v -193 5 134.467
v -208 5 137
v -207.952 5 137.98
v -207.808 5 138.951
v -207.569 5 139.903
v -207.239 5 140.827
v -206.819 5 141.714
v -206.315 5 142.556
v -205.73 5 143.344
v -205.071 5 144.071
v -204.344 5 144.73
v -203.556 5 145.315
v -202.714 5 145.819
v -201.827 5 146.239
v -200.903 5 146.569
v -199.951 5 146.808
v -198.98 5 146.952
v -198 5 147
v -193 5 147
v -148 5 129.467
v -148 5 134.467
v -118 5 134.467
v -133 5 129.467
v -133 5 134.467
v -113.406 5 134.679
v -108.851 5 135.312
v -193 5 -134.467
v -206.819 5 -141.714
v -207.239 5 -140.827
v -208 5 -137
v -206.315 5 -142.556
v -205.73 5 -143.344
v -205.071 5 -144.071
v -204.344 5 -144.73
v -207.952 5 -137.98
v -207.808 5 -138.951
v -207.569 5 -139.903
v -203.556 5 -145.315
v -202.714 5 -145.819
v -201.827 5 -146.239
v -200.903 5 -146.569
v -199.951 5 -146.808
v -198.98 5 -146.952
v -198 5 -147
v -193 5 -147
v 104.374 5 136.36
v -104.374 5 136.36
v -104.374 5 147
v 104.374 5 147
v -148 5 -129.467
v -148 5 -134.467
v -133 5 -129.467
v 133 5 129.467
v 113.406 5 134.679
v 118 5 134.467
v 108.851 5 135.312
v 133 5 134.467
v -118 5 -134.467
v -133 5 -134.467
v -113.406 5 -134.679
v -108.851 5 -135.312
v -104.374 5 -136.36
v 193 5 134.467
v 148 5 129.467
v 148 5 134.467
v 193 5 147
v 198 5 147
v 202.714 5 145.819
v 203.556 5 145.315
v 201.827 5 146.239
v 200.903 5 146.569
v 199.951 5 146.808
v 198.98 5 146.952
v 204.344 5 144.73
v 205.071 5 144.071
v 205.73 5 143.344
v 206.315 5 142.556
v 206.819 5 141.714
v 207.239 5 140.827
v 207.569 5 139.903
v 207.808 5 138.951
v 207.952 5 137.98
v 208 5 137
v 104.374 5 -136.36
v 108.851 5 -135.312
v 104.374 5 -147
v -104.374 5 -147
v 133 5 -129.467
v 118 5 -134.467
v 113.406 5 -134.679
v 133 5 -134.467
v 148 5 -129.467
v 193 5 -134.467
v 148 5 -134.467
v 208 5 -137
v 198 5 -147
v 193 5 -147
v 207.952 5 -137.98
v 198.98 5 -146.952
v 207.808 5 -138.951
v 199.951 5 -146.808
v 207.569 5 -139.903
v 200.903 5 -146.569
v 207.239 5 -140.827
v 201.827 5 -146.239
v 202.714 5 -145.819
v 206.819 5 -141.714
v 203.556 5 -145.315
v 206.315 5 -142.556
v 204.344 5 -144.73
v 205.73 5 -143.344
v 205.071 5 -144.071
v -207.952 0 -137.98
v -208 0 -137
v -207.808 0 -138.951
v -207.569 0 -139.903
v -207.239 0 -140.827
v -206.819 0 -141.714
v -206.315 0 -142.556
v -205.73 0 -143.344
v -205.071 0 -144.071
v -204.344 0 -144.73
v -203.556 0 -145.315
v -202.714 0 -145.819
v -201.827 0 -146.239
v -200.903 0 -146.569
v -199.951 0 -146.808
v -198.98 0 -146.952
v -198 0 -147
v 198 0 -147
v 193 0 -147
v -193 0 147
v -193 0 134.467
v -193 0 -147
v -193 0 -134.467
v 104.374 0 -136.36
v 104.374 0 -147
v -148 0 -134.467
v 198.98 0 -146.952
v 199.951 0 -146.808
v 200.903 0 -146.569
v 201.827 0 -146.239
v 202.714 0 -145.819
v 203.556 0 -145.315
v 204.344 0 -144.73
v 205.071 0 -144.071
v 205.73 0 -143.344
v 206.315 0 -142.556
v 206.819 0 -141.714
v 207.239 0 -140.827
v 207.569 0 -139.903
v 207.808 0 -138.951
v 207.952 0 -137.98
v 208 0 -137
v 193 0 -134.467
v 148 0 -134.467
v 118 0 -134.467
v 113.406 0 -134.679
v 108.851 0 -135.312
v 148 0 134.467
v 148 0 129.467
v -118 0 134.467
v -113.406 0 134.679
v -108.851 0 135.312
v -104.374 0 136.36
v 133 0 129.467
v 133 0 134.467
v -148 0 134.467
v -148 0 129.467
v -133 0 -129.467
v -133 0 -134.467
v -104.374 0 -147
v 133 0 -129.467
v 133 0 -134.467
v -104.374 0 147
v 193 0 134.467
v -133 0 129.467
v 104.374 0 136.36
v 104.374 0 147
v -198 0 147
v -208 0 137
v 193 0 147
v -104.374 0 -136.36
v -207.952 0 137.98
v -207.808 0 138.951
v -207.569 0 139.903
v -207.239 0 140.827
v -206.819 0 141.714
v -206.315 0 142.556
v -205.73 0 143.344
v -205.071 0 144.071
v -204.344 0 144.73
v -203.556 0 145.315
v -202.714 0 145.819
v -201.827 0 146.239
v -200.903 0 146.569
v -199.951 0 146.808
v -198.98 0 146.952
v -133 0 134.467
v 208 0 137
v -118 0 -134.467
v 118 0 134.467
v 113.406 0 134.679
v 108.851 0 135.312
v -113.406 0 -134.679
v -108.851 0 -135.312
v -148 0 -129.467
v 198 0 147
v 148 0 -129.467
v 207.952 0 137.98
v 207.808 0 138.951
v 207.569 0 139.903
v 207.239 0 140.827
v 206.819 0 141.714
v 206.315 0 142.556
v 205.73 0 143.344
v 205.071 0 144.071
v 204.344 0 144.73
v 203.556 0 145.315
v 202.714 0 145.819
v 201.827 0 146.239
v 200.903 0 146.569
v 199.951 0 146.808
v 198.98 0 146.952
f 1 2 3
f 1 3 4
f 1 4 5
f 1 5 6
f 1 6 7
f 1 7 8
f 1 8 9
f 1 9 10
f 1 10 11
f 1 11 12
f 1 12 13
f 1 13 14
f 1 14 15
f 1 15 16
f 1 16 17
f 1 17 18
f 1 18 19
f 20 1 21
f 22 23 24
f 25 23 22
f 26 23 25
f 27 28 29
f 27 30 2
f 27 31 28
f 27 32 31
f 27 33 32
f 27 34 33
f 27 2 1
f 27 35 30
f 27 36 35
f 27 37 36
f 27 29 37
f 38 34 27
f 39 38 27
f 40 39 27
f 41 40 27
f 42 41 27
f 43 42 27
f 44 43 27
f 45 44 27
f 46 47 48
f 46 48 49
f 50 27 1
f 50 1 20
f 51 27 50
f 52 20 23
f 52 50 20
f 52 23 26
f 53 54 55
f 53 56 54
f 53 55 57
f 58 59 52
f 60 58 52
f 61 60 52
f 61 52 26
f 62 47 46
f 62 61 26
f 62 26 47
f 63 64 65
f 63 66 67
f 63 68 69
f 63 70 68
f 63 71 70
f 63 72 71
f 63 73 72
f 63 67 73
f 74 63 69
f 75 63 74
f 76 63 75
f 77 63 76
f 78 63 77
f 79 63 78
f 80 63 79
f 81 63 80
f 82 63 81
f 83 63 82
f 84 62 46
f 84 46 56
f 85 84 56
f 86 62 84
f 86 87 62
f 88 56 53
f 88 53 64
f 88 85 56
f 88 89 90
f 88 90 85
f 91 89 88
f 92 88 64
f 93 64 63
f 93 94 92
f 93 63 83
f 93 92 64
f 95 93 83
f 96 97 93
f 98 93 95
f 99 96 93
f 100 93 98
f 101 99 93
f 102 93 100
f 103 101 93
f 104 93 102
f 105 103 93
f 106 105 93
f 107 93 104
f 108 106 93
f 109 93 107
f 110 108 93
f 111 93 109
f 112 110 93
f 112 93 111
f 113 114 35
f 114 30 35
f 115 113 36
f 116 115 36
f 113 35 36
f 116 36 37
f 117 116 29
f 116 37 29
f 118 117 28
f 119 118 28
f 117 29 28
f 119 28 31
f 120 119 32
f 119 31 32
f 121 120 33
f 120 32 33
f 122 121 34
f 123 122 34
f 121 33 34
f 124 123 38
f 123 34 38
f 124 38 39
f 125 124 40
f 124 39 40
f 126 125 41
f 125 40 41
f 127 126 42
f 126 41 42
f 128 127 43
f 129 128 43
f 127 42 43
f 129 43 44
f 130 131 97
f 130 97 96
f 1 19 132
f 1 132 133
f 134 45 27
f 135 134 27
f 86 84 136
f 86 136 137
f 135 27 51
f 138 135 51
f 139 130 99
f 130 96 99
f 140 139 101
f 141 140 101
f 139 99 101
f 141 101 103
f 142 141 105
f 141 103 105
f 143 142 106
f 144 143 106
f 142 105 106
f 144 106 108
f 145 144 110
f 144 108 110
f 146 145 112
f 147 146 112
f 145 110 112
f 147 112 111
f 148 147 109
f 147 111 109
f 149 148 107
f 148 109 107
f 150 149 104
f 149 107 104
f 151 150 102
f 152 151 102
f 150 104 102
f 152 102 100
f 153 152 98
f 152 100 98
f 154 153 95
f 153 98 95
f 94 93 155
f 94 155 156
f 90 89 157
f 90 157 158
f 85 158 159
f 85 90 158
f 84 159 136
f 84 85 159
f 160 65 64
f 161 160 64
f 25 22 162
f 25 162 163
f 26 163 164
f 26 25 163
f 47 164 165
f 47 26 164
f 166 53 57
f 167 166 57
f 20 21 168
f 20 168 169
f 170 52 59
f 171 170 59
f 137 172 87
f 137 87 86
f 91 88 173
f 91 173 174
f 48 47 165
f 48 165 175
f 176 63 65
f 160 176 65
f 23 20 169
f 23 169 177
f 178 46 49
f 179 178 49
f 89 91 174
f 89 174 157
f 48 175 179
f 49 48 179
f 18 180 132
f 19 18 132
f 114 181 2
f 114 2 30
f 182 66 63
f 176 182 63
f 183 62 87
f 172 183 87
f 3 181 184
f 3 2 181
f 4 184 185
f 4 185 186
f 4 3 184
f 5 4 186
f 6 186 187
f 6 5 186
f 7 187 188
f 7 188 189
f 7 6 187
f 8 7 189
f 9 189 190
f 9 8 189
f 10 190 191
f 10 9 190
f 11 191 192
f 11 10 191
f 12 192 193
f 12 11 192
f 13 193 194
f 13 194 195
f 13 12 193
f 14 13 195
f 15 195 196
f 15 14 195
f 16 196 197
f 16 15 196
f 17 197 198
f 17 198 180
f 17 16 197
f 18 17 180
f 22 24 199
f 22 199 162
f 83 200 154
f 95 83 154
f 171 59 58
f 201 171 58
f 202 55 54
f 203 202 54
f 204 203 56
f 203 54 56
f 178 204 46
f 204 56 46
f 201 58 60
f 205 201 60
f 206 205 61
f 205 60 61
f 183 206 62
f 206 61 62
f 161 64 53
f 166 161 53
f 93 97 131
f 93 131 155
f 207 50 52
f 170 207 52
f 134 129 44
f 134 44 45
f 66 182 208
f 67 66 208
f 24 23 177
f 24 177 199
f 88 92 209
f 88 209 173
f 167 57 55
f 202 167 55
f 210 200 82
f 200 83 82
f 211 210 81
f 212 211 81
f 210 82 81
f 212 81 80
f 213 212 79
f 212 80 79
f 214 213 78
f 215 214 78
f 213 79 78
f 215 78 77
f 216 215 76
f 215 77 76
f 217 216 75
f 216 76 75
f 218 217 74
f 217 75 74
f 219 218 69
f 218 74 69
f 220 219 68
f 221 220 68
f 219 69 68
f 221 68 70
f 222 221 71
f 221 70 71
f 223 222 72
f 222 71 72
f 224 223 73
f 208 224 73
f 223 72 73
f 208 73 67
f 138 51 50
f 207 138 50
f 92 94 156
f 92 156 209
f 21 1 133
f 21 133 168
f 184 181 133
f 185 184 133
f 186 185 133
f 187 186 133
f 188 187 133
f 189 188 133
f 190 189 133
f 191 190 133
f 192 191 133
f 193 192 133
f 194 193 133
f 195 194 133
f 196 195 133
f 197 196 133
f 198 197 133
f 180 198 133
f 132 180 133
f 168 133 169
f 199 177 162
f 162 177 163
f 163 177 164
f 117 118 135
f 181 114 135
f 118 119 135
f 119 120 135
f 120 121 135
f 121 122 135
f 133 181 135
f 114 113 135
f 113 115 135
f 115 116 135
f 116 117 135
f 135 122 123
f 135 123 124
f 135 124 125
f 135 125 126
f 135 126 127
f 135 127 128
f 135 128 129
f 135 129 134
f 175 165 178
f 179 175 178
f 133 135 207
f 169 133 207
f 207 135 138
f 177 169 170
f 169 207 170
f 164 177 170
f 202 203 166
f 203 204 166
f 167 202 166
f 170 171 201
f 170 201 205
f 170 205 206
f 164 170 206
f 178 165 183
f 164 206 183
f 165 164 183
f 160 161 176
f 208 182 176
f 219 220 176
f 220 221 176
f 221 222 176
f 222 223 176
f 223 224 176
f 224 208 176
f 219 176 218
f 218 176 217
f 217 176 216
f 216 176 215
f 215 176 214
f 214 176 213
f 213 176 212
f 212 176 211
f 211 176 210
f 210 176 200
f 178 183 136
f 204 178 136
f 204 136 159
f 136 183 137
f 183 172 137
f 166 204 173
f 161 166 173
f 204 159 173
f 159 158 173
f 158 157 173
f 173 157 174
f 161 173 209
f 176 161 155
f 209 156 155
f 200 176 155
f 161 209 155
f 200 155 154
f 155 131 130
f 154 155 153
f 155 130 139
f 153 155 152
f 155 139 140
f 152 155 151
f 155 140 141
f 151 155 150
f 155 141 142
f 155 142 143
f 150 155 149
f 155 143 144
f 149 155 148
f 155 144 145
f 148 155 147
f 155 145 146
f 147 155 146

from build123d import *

# Parameters (mm, degrees)
CROQUIS1_W              = 416
CROQUIS1_H              = 294
SALIENTE_EXTRUIR1_DEPTH = 5
CORTAR_EXTRUIR1_DEPTH   = 255.750858684
SIMETR_A2_COPY_1_DEPTH  = 255.750858684
REDONDEO1_R             = 10


with BuildPart() as part:
    # Croquis1 → Saliente-Extruir1 (new body)
    with BuildSketch(Plane(origin=(0, 0, 0), x_dir=(1, 0, 0), z_dir=(0, 1, 0))):
        Rectangle(CROQUIS1_W, CROQUIS1_H)
    extrude(amount=SALIENTE_EXTRUIR1_DEPTH)

    # Croquis2 → Cortar-Extruir1 (cut, through all)
    with BuildSketch(Plane(origin=(0, 5, 0), x_dir=(1, 0, 0), z_dir=(0, 1, 0))):
        with BuildLine():
            Line((-193, 154.467494322), (-193, 134.467494322))
            Line((-193, 134.467494322), (-148, 134.467494322))
            Line((-148, 134.467494322), (-148, 129.467494322))
            Line((-148, 129.467494322), (-133, 129.467494322))
            Line((-133, 129.467494322), (-133, 134.467494322))
            Line((-133, 134.467494322), (-118, 134.467494322))
            ThreePointArc((-118, 134.467494322), (-111.121581436, 134.942880664), (-104.373959122, 136.36))
            Line((-104.373959122, 136.36), (-104.373959122, 156.36))
            Line((-104.373959122, 156.36), (-193.373959122, 156.36))
            Line((-193.373959122, 156.36), (-193, 154.467494322))
        make_face()
    cortar_extruir1 = extrude(amount=-CORTAR_EXTRUIR1_DEPTH, mode=Mode.SUBTRACT)

    # Simetría1: Cortar-Extruir1 across plane
    add(cortar_extruir1.mirror(Plane.XY), mode=Mode.SUBTRACT)

    # Simetría2: Cortar-Extruir1 across plane
    add(cortar_extruir1.mirror(Plane(origin=(0, 0, 0), x_dir=(0, 0, 1), z_dir=(1, 0, 0))), mode=Mode.SUBTRACT)

    # Simetría2 copy 1 sketch → Simetría2 copy 1 (cut, through all)
    with BuildSketch(Plane(origin=(0, 5, 0), x_dir=(-1, 0, 0), z_dir=(0, 1, 0))):
        with BuildLine():
            Line((-193, 154.467494322), (-193, 134.467494322))
            Line((-193, 134.467494322), (-148, 134.467494322))
            Line((-148, 134.467494322), (-148, 129.467494322))
            Line((-148, 129.467494322), (-133, 129.467494322))
            Line((-133, 129.467494322), (-133, 134.467494322))
            Line((-133, 134.467494322), (-118, 134.467494322))
            ThreePointArc((-118, 134.467494322), (-111.121581436, 134.942880664), (-104.373959122, 136.36))
            Line((-104.373959122, 136.36), (-104.373959122, 156.36))
            Line((-104.373959122, 156.36), (-193.373959122, 156.36))
            Line((-193.373959122, 156.36), (-193, 154.467494322))
        make_face()
    extrude(amount=-SIMETR_A2_COPY_1_DEPTH, mode=Mode.SUBTRACT)

    # Redondeo1
    redondeo1_edges = [part.edges().sort_by_distance(p)[0] for p in [
        (208, 2.5, 147),
        (-208, 2.5, 147),
        (-208, 2.5, -147),
        (208, 2.5, -147),
    ]]
    fillet(redondeo1_edges, radius=REDONDEO1_R)


solid = part.part
